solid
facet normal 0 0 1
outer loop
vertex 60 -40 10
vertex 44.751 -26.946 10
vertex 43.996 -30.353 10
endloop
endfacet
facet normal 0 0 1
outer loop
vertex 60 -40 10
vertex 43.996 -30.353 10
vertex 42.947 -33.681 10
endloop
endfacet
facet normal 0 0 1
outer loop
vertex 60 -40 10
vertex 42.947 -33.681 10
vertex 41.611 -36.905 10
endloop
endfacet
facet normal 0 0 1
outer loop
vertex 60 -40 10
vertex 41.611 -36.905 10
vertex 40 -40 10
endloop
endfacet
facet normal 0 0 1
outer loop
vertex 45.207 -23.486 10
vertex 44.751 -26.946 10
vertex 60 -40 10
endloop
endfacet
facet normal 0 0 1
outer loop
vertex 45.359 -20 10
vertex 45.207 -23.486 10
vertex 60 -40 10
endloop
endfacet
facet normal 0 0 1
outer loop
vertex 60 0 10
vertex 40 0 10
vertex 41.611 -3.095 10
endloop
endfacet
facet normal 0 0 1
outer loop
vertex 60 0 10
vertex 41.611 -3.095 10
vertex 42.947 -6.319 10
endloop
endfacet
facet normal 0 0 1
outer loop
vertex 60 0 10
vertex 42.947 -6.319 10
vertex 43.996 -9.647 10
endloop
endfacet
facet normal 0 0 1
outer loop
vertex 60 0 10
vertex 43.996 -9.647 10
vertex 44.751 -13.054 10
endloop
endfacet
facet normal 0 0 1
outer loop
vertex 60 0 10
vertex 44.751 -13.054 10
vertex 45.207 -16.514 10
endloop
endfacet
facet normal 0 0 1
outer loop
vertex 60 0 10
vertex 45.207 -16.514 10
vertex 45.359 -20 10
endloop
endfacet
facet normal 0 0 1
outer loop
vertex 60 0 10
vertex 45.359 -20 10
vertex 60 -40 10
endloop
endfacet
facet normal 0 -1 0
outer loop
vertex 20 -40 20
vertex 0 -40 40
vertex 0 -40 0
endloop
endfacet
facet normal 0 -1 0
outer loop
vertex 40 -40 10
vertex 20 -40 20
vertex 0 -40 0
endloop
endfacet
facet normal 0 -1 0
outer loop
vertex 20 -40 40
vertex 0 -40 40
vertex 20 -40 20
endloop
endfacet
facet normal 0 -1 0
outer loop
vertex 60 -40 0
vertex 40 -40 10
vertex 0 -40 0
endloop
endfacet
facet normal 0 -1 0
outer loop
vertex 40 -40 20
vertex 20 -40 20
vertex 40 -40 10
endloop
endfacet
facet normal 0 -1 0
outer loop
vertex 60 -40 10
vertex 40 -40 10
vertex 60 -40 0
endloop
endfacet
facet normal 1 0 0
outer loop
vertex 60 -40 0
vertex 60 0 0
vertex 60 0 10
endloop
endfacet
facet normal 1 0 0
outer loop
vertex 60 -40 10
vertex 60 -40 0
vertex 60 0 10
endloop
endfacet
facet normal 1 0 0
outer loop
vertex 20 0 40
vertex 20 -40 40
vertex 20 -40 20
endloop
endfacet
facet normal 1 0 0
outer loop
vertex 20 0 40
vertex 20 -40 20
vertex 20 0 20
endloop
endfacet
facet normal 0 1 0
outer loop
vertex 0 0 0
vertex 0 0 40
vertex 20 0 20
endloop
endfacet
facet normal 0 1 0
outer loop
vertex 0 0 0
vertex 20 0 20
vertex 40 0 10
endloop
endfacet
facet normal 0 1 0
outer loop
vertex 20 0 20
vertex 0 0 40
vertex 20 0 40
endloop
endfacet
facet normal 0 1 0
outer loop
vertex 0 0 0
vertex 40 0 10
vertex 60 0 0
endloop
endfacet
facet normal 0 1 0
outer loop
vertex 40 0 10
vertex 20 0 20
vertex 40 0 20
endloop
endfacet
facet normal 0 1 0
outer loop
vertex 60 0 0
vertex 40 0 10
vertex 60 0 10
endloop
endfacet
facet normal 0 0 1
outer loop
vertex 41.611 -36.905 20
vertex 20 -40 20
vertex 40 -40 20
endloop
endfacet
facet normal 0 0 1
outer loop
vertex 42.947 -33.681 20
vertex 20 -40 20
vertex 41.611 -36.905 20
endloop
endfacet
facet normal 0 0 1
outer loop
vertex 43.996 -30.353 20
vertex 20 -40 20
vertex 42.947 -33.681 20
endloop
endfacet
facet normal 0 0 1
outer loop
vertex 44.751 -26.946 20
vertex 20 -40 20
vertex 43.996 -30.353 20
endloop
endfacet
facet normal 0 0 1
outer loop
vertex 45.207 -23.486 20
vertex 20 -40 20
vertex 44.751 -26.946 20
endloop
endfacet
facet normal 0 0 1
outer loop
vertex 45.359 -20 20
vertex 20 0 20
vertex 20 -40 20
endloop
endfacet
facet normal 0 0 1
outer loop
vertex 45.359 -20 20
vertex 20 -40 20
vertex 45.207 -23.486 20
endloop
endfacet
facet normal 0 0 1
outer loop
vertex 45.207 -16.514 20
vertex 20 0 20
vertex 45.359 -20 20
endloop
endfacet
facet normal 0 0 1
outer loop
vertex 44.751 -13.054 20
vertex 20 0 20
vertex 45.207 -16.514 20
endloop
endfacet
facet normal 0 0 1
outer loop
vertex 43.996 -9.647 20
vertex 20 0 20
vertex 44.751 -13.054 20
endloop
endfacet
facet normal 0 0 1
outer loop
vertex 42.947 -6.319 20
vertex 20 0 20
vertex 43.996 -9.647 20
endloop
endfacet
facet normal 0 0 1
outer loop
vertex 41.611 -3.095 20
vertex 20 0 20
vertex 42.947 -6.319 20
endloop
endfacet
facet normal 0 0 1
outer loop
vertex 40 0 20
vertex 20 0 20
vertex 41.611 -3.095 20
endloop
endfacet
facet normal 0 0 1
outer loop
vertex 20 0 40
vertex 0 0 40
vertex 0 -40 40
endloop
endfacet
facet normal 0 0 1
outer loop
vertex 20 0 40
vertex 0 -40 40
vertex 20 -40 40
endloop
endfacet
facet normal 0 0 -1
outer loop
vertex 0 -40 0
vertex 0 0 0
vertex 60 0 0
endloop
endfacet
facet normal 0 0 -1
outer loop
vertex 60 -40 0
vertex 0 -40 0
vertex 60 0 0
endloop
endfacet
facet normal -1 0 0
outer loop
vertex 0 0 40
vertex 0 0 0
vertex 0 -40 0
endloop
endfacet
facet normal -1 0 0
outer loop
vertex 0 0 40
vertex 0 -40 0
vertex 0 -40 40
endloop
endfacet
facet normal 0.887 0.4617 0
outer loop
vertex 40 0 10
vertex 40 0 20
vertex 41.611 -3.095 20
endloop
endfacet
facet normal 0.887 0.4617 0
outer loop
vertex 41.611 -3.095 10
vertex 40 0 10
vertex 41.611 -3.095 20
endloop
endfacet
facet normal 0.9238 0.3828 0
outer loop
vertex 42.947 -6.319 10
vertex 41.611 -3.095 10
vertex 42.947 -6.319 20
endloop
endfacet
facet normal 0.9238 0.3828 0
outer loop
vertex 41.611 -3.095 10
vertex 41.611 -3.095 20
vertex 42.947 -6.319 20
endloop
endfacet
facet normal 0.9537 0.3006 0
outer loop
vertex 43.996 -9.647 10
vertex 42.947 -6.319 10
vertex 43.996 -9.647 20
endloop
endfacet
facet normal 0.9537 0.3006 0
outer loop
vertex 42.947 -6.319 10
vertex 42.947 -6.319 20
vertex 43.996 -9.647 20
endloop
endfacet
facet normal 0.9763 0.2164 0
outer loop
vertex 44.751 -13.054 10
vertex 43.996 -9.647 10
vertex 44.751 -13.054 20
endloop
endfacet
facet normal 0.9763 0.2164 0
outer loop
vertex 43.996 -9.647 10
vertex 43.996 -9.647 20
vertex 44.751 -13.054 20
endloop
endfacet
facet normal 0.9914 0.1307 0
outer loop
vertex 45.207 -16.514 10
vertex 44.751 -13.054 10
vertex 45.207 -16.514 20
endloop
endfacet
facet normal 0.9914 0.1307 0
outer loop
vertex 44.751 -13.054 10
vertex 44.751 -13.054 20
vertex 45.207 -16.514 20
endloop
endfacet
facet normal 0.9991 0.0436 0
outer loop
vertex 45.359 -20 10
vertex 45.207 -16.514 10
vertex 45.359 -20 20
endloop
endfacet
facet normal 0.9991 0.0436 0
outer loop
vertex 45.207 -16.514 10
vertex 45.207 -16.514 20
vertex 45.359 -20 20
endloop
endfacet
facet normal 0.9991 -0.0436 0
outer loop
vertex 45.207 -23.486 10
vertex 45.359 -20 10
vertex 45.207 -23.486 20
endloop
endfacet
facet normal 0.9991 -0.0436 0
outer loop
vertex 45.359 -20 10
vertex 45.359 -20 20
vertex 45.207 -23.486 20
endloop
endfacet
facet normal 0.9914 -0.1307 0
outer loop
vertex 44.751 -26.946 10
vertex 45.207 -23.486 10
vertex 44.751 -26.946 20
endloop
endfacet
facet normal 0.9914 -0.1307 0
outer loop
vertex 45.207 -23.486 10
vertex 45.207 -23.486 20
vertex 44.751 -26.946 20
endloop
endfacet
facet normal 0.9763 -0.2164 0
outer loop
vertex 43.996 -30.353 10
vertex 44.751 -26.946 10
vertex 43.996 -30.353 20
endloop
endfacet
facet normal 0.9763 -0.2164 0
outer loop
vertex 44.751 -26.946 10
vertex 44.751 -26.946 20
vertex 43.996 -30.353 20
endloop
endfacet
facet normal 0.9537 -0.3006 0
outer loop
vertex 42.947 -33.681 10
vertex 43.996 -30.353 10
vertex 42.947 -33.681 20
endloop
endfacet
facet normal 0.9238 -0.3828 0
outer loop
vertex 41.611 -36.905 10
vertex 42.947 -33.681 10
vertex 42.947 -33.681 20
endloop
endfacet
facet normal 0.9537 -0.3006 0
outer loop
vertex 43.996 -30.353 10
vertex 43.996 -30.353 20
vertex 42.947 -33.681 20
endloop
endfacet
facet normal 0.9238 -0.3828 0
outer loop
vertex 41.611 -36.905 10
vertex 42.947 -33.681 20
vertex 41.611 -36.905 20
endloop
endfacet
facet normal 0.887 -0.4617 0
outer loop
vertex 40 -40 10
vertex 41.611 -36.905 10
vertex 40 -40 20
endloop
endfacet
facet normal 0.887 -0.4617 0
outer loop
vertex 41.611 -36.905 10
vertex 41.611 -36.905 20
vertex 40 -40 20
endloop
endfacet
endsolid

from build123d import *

# Parameters (mm, degrees)
F0_W     = 60
F0_H     = 40
F1_DEPTH = 40
F2_W     = 40
F2_H     = 40
F3_DEPTH = 20
F5_DEPTH = 10


with BuildPart() as f1:
    # F0 (on Front) → F1 (new body)
    with BuildSketch(Plane.XZ):
        with Locations((30, 20)):
            Rectangle(F0_W, F0_H)
    extrude(amount=F1_DEPTH)

    # F2 (on face) → F3 (cut)
    with BuildSketch(Plane.XY.offset(40)):
        with Locations((40, -20)):
            Rectangle(F2_W, F2_H)
    extrude(amount=-F3_DEPTH, mode=Mode.SUBTRACT)

    # F4 (on face) → F5 (cut)
    with BuildSketch(Plane.XY.offset(20)):
        with BuildLine():
            Line((60, 0), (40, 0))
            ThreePointArc((40, 0), (45.358984, -20), (40, -40))
            Line((40, -40), (60, -40))
            Line((60, -40), (60, 0))
        make_face()
    extrude(amount=-F5_DEPTH, mode=Mode.SUBTRACT)


solid = f1.part
